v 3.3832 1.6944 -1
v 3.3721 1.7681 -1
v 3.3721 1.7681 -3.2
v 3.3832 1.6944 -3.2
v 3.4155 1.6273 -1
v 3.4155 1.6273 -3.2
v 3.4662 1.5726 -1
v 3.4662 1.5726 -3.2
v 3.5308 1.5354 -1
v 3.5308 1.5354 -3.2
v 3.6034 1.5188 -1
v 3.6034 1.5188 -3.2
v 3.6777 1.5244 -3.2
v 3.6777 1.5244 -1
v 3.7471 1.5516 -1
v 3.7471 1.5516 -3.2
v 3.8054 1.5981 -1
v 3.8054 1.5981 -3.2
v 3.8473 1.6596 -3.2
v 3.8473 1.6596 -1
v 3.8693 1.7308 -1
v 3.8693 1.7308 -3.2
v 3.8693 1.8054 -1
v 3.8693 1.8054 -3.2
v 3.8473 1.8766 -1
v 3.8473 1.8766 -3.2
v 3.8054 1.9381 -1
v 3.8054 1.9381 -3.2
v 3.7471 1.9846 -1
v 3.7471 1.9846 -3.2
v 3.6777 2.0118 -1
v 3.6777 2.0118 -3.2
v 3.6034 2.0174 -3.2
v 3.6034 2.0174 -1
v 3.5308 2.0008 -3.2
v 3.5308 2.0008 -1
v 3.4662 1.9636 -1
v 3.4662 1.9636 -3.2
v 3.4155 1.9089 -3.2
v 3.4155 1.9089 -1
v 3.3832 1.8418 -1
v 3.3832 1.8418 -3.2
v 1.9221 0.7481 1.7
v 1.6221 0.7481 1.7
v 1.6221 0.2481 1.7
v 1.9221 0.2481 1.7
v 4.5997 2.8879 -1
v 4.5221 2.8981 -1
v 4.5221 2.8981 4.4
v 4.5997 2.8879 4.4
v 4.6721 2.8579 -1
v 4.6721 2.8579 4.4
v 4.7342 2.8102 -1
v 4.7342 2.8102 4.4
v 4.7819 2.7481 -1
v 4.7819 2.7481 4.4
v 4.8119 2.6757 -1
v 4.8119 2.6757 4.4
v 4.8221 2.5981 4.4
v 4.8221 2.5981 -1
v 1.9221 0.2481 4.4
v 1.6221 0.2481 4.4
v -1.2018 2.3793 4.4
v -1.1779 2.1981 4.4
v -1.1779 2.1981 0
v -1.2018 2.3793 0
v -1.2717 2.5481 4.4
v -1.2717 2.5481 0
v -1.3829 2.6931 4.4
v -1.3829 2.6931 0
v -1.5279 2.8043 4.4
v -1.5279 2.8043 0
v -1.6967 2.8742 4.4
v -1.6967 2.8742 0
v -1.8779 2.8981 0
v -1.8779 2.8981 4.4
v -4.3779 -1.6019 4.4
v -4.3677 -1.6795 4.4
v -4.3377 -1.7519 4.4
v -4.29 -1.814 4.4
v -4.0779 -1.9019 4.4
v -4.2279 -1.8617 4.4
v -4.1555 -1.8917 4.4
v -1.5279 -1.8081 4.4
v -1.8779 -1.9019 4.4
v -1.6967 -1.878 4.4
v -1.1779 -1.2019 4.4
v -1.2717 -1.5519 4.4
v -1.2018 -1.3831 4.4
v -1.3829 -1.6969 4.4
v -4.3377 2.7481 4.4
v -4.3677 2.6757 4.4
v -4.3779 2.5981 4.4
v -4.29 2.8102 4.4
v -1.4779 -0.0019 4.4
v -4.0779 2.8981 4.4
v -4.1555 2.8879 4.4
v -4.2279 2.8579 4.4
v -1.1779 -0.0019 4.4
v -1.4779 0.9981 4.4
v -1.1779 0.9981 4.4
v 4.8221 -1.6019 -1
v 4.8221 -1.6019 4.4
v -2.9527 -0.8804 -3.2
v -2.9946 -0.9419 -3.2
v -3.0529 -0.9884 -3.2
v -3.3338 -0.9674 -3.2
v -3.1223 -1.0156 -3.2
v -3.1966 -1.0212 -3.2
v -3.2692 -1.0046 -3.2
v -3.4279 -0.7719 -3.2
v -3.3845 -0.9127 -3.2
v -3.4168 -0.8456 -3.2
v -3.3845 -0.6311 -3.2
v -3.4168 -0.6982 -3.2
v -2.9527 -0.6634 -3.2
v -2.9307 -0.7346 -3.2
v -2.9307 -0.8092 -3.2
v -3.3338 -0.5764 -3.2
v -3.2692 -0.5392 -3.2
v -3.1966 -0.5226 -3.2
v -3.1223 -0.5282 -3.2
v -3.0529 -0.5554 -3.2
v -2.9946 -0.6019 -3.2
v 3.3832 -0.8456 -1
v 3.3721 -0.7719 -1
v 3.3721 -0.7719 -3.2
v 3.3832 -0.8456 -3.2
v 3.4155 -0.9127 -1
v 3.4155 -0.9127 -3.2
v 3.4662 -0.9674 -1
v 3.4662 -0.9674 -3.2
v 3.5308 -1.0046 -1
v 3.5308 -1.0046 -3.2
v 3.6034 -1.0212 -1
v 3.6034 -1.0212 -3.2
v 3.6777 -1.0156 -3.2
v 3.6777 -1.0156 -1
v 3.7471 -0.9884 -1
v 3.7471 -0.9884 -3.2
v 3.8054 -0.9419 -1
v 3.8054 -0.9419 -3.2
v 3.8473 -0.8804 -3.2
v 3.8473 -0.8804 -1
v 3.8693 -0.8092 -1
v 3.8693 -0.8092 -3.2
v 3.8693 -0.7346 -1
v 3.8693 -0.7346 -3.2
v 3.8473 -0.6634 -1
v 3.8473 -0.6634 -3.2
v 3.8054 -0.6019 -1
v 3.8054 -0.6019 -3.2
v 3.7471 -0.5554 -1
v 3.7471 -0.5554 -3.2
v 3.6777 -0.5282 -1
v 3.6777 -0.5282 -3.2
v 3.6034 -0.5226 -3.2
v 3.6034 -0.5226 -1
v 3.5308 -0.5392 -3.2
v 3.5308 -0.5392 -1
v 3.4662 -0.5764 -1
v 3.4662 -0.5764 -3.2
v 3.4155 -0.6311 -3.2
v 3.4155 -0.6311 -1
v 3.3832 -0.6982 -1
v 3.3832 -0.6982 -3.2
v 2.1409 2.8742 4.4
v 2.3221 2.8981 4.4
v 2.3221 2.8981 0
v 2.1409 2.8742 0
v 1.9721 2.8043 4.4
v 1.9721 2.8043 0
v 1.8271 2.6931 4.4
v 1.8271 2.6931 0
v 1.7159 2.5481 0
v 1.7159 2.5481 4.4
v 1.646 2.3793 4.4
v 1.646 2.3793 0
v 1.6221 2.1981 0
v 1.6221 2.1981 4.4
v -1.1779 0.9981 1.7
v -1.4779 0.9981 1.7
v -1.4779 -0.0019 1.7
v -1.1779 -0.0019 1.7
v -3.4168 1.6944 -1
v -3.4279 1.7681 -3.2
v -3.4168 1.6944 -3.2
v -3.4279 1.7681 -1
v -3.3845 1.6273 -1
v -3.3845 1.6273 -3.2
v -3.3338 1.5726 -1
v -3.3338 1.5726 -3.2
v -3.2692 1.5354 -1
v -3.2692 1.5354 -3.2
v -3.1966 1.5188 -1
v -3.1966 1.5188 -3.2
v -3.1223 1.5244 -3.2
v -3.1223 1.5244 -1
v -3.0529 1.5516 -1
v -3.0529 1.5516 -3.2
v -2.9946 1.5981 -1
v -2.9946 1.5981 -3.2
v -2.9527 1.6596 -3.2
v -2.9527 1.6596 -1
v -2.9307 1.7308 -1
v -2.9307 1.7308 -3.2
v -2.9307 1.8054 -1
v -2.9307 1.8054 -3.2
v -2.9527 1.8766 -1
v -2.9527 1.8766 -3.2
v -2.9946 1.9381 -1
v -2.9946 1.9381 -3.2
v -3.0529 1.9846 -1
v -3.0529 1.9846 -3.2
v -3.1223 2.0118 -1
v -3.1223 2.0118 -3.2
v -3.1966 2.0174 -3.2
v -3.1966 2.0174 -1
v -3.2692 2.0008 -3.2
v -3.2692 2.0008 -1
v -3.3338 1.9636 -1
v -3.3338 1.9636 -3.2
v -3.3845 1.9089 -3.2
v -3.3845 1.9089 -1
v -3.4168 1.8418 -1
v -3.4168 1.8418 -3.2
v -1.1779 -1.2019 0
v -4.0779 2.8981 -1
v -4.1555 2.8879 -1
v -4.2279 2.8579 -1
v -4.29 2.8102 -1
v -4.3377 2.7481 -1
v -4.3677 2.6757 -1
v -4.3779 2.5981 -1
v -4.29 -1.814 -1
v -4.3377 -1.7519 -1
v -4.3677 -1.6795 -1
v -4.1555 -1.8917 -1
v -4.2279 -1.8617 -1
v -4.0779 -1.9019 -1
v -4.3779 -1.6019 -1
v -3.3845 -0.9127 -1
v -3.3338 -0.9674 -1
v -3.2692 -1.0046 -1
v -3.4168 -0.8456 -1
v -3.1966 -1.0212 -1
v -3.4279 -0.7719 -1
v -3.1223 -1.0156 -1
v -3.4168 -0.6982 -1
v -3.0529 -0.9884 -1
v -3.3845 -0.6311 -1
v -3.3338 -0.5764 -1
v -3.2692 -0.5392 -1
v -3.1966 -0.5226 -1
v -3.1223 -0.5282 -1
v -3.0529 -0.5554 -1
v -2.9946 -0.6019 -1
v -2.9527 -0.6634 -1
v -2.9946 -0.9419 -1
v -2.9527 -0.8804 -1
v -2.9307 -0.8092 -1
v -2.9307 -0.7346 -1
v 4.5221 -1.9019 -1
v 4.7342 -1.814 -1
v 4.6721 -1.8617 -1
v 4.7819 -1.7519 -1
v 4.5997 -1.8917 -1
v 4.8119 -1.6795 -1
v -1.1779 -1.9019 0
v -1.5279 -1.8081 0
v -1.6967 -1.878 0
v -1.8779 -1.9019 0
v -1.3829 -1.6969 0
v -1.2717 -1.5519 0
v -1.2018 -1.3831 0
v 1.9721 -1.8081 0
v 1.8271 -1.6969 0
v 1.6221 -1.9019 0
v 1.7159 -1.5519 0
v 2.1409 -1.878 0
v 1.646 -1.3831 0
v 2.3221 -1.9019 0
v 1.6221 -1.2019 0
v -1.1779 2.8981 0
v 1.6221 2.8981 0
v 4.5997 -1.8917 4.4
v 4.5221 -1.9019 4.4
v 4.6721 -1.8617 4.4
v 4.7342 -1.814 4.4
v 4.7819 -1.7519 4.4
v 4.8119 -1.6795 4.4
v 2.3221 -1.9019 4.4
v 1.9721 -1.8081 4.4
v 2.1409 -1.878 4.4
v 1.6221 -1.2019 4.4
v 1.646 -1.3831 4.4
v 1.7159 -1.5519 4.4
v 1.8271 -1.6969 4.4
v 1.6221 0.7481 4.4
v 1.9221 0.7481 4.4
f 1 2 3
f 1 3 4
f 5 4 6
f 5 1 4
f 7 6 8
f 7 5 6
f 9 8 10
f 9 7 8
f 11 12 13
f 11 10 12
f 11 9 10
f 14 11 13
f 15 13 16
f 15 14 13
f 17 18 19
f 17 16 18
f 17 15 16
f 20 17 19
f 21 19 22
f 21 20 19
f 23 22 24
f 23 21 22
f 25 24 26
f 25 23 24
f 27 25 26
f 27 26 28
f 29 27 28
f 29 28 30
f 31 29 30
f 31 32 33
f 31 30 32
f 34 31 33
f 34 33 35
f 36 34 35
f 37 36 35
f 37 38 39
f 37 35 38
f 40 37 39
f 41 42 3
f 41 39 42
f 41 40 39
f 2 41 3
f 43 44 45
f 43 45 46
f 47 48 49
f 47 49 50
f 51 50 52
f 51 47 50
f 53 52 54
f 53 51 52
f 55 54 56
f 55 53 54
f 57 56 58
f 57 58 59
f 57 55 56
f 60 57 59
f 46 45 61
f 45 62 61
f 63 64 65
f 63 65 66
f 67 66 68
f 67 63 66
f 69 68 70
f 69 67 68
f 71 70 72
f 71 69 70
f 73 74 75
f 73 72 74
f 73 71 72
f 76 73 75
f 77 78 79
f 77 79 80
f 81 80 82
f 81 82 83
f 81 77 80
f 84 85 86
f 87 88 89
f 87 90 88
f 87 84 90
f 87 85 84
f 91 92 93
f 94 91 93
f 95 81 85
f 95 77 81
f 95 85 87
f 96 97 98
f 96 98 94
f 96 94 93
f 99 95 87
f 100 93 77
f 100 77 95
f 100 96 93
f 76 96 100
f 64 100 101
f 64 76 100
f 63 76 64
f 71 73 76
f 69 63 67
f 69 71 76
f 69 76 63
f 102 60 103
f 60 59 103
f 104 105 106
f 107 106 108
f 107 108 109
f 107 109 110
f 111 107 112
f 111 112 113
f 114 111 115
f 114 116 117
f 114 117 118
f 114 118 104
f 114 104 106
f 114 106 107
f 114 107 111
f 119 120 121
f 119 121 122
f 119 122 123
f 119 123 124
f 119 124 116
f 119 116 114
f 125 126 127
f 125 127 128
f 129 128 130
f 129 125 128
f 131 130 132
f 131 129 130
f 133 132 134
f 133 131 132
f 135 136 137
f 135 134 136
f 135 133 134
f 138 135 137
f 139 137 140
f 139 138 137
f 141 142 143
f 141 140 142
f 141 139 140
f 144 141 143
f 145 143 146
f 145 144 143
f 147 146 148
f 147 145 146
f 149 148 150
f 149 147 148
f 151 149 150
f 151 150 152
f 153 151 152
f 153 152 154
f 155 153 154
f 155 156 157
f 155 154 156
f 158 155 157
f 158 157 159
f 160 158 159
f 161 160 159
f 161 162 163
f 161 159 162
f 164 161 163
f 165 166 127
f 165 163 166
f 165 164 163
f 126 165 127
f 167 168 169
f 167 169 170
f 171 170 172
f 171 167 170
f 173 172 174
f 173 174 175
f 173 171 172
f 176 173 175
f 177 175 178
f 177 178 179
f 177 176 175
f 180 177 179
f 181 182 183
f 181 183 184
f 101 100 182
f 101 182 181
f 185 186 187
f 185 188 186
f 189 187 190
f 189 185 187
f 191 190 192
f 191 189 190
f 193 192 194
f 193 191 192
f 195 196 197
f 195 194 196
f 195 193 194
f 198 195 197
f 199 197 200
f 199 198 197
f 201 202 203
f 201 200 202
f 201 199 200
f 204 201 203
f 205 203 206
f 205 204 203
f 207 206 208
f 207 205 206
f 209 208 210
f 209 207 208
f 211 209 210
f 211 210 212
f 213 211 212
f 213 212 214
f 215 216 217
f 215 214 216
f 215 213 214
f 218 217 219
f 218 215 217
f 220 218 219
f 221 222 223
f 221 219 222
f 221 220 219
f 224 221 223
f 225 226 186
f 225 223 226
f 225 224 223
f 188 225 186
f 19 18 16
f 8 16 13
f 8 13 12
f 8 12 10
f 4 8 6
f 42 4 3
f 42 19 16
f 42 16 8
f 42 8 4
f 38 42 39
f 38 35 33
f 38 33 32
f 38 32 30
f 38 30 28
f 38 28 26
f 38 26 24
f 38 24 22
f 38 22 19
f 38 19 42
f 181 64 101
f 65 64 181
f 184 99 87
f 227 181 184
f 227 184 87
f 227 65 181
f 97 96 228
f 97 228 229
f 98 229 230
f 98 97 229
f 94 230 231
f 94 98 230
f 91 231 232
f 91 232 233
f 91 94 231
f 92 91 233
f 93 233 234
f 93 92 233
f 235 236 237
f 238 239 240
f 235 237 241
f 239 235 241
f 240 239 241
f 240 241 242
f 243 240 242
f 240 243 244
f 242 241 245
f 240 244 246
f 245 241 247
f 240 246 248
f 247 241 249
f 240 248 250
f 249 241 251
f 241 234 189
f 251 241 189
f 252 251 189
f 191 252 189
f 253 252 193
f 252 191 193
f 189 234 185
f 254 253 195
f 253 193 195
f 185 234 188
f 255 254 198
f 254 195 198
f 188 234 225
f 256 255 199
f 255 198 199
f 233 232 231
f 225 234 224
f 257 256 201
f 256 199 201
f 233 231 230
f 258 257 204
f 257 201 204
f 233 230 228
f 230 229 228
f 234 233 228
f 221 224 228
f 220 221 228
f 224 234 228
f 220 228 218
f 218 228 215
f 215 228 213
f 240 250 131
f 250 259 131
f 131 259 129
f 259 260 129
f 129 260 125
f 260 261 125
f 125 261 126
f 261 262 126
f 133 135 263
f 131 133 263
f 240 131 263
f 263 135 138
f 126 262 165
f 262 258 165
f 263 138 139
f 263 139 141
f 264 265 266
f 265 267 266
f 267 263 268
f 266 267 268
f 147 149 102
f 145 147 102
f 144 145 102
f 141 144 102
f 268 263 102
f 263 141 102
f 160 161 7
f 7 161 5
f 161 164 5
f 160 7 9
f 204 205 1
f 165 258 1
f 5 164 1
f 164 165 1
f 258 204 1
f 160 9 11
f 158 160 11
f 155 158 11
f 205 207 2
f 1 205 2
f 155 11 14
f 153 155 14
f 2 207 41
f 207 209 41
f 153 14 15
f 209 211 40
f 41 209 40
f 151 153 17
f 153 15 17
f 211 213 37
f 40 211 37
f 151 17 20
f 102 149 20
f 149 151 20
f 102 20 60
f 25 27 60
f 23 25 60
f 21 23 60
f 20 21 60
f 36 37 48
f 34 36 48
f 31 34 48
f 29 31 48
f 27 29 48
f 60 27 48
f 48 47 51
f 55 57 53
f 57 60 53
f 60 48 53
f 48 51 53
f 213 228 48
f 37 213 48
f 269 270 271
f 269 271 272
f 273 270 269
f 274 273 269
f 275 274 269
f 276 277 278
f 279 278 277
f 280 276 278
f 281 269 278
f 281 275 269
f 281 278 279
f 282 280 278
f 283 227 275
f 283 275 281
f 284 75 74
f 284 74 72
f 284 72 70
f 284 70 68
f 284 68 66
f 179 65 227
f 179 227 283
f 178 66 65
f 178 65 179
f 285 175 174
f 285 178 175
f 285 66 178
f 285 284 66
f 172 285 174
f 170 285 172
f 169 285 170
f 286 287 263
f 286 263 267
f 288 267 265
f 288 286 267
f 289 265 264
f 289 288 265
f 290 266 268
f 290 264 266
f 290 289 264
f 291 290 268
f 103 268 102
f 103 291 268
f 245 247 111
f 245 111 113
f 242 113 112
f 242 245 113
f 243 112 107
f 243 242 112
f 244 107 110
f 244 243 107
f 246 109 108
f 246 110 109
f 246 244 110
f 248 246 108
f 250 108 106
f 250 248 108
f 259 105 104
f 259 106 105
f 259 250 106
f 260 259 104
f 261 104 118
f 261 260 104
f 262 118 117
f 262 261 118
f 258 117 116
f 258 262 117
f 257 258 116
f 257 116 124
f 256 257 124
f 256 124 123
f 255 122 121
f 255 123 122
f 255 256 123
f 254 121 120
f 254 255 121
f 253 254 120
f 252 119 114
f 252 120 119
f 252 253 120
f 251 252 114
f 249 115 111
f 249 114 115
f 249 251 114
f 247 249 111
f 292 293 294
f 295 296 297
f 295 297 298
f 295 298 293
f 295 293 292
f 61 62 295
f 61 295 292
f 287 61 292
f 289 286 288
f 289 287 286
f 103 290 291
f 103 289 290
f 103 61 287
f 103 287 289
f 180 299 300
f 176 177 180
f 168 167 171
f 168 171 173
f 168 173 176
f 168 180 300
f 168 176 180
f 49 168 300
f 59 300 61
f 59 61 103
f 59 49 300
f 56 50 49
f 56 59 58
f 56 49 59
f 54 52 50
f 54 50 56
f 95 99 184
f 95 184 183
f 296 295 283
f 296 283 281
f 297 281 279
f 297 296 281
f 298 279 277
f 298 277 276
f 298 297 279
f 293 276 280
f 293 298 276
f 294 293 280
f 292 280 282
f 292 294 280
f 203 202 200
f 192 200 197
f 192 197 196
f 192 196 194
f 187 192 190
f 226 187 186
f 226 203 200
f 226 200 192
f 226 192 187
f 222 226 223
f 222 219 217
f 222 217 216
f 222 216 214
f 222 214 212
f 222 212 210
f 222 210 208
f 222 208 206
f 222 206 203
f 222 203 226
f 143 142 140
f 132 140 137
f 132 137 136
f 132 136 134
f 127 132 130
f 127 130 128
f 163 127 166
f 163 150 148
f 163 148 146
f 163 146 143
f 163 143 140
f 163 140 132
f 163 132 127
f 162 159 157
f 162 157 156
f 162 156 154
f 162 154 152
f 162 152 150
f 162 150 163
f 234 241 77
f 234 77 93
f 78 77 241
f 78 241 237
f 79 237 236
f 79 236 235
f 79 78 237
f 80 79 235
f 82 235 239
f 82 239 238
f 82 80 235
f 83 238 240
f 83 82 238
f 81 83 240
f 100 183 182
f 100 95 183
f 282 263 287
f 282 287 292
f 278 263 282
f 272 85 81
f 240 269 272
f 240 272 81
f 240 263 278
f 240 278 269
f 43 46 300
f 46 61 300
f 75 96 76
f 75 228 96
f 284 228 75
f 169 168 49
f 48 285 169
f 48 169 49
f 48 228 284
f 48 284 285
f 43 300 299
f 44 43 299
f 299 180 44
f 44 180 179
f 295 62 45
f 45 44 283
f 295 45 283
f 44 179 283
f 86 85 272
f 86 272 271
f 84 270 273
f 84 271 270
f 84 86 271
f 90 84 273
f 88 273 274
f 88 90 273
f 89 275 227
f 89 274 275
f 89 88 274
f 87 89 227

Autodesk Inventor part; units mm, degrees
ref_plane "YZ Plane" through (0, 0, 0) normal (1, 0, 0) x (0, 1, 0)
ref_plane "XZ Plane" through (0, 0, 0) normal (0, 1, 0) x (-1, 0, 0)
ref_plane "XY Plane" through (0, 0, 0) normal (0, 0, 1) x (1, 0, 0)
sketch "Sketch1" plane through (0, 0, 0) normal (0, 0, 1) x (1, 0, 0)
  line L0 (-4.3779, 2.8981) -> (4.8221, 2.8981)
  line L1 (4.8221, 2.8981) -> (4.8221, -1.9019)
  line L2 (4.8221, -1.9019) -> (-4.3779, -1.9019)
  line L3 (-4.3779, -1.9019) -> (-4.3779, 2.8981)
  line L4 (-1.1779, 2.8981) -> (-1.1779, -1.9019)
  line L5 (1.6221, 2.8981) -> (1.6221, -1.9019)
  point P0 (0, 0)
  dimension "d0" = 2.8
  dimension "d1" = 9.2
  dimension "d2" = 3.2
  dimension "d11" = 4.8
extrude "Extrusion1" add sketch "Sketch1" along normal blind 4.4 contours L0 L4 L2 L3 | L0 L1 L2 L5
extrude "Extrusion2" add sketch "Sketch1" against normal blind 1
sketch "Sketch2" plane through (0, 0, -1) normal (0, 0, -1) x (-1, 0, 0)
  line L0 (4.3779, 2.8981) -> (-4.8221, 2.8981) projected
  line L1 (-4.8221, 2.8981) -> (-4.8221, -1.9019) projected
  line L2 (-4.8221, -1.9019) -> (4.3779, -1.9019) projected
  line L3 (4.3779, -1.9019) -> (4.3779, 2.8981) projected
  circle A0 centre (-3.6221, 1.7681) radius 0.25
  circle A1 centre (-3.6221, -0.7719) radius 0.25
  circle A2 centre (3.1779, 1.7681) radius 0.25
  circle A3 centre (3.1779, -0.7719) radius 0.25
  point P0 (0, 0)
  dimension "d7" = 2.54
  dimension "d8" = 6.8
  dimension "d9" = 9.2
  dimension "d10" = 4.8
  dimension "d12" = 1.13
  dimension "d13" = 1.2
  dimension "d14" = 0.5
  dimension "d15" = 0.5
  dimension "d16" = 0.5
  dimension "d17" = 0.5
extrude "Extrusion3" add sketch "Sketch2" along normal blind 2.2 contours A0 | A1 | A2 | A3
sketch "Sketch3" plane through (0, 0, 4.4) normal (0, 0, 1) x (1, 0, 0)
  line L0 (4.8221, -1.9019) -> (4.8221, 2.8981) projected
  line L1 (4.8221, 2.8981) -> (1.6221, 2.8981) projected
  line L2 (1.6221, 2.8981) -> (1.6221, -1.9019) projected
  line L3 (1.6221, -1.9019) -> (4.8221, -1.9019) projected
  line L4 (-4.3779, 2.8981) -> (-4.3779, -1.9019) projected
  line L5 (-4.3779, -1.9019) -> (-1.1779, -1.9019) projected
  line L6 (-1.1779, -1.9019) -> (-1.1779, 2.8981) projected
  line L7 (-1.1779, 2.8981) -> (-4.3779, 2.8981) projected
  line L8 (1.6221, 2.8981) -> (1.6221, -1.9019) projected
  line L9 (1.6221, 0.2481) -> (1.9221, 0.2481)
  line L10 (1.9221, 0.2481) -> (1.9221, 0.7481)
  line L11 (1.9221, 0.7481) -> (1.6221, 0.7481)
  line L12 (1.6221, 0.7481) -> (1.6221, 0.2481)
  line L13 (-1.1779, -0.0019) -> (-1.4779, -0.0019)
  line L14 (-1.4779, -0.0019) -> (-1.4779, 0.9981)
  line L15 (-1.4779, 0.9981) -> (-1.1779, 0.9981)
  line L16 (-1.1779, 0.9981) -> (-1.1779, -0.0019)
  point P0 (0, 0)
  dimension "d20" = 0.3
  dimension "d21" = 0.5
  dimension "d22" = 0.3
  dimension "d23" = 1
  dimension "d24" = 4.8
  dimension "d25" = 2.15
  dimension "d26" = 1.9
extrude "Extrusion4" cut sketch "Sketch3" against normal blind 2.7 contours L2 L11 L10 L9 | L6 L13 L14 L15
fillet "Fillet1" radius 0.7 4 edges at (1.6221, -1.9019, 2.2) (1.6221, 2.8981, 2.2) (-1.1779, 2.8981, 2.2) (-1.1779, -1.9019, 2.2)
fillet "Fillet1" radius 0.3 4 edges at (-4.3779, -1.9019, 1.7) (-4.3779, 2.8981, 1.7) (4.8221, 2.8981, 1.7) (4.8221, -1.9019, 1.7)
equation "\"d2\" = -0.5 * d0 + 0.5 * d1"
equation "\"d12\" = -0.5 * d7 + 0.5 * d10"
equation "\"d13\" = -0.5 * d8 + 0.5 * d9"
equation "\"d20\" = d22"
equation "\"d25\" = -0.5 * d21 + 0.5 * d24"
equation "\"d26\" = -0.5 * d23 + 0.5 * d24"
properties part number "COTS_Vishay_TCST1230_Optocoupler" material "ABS Plastic"
